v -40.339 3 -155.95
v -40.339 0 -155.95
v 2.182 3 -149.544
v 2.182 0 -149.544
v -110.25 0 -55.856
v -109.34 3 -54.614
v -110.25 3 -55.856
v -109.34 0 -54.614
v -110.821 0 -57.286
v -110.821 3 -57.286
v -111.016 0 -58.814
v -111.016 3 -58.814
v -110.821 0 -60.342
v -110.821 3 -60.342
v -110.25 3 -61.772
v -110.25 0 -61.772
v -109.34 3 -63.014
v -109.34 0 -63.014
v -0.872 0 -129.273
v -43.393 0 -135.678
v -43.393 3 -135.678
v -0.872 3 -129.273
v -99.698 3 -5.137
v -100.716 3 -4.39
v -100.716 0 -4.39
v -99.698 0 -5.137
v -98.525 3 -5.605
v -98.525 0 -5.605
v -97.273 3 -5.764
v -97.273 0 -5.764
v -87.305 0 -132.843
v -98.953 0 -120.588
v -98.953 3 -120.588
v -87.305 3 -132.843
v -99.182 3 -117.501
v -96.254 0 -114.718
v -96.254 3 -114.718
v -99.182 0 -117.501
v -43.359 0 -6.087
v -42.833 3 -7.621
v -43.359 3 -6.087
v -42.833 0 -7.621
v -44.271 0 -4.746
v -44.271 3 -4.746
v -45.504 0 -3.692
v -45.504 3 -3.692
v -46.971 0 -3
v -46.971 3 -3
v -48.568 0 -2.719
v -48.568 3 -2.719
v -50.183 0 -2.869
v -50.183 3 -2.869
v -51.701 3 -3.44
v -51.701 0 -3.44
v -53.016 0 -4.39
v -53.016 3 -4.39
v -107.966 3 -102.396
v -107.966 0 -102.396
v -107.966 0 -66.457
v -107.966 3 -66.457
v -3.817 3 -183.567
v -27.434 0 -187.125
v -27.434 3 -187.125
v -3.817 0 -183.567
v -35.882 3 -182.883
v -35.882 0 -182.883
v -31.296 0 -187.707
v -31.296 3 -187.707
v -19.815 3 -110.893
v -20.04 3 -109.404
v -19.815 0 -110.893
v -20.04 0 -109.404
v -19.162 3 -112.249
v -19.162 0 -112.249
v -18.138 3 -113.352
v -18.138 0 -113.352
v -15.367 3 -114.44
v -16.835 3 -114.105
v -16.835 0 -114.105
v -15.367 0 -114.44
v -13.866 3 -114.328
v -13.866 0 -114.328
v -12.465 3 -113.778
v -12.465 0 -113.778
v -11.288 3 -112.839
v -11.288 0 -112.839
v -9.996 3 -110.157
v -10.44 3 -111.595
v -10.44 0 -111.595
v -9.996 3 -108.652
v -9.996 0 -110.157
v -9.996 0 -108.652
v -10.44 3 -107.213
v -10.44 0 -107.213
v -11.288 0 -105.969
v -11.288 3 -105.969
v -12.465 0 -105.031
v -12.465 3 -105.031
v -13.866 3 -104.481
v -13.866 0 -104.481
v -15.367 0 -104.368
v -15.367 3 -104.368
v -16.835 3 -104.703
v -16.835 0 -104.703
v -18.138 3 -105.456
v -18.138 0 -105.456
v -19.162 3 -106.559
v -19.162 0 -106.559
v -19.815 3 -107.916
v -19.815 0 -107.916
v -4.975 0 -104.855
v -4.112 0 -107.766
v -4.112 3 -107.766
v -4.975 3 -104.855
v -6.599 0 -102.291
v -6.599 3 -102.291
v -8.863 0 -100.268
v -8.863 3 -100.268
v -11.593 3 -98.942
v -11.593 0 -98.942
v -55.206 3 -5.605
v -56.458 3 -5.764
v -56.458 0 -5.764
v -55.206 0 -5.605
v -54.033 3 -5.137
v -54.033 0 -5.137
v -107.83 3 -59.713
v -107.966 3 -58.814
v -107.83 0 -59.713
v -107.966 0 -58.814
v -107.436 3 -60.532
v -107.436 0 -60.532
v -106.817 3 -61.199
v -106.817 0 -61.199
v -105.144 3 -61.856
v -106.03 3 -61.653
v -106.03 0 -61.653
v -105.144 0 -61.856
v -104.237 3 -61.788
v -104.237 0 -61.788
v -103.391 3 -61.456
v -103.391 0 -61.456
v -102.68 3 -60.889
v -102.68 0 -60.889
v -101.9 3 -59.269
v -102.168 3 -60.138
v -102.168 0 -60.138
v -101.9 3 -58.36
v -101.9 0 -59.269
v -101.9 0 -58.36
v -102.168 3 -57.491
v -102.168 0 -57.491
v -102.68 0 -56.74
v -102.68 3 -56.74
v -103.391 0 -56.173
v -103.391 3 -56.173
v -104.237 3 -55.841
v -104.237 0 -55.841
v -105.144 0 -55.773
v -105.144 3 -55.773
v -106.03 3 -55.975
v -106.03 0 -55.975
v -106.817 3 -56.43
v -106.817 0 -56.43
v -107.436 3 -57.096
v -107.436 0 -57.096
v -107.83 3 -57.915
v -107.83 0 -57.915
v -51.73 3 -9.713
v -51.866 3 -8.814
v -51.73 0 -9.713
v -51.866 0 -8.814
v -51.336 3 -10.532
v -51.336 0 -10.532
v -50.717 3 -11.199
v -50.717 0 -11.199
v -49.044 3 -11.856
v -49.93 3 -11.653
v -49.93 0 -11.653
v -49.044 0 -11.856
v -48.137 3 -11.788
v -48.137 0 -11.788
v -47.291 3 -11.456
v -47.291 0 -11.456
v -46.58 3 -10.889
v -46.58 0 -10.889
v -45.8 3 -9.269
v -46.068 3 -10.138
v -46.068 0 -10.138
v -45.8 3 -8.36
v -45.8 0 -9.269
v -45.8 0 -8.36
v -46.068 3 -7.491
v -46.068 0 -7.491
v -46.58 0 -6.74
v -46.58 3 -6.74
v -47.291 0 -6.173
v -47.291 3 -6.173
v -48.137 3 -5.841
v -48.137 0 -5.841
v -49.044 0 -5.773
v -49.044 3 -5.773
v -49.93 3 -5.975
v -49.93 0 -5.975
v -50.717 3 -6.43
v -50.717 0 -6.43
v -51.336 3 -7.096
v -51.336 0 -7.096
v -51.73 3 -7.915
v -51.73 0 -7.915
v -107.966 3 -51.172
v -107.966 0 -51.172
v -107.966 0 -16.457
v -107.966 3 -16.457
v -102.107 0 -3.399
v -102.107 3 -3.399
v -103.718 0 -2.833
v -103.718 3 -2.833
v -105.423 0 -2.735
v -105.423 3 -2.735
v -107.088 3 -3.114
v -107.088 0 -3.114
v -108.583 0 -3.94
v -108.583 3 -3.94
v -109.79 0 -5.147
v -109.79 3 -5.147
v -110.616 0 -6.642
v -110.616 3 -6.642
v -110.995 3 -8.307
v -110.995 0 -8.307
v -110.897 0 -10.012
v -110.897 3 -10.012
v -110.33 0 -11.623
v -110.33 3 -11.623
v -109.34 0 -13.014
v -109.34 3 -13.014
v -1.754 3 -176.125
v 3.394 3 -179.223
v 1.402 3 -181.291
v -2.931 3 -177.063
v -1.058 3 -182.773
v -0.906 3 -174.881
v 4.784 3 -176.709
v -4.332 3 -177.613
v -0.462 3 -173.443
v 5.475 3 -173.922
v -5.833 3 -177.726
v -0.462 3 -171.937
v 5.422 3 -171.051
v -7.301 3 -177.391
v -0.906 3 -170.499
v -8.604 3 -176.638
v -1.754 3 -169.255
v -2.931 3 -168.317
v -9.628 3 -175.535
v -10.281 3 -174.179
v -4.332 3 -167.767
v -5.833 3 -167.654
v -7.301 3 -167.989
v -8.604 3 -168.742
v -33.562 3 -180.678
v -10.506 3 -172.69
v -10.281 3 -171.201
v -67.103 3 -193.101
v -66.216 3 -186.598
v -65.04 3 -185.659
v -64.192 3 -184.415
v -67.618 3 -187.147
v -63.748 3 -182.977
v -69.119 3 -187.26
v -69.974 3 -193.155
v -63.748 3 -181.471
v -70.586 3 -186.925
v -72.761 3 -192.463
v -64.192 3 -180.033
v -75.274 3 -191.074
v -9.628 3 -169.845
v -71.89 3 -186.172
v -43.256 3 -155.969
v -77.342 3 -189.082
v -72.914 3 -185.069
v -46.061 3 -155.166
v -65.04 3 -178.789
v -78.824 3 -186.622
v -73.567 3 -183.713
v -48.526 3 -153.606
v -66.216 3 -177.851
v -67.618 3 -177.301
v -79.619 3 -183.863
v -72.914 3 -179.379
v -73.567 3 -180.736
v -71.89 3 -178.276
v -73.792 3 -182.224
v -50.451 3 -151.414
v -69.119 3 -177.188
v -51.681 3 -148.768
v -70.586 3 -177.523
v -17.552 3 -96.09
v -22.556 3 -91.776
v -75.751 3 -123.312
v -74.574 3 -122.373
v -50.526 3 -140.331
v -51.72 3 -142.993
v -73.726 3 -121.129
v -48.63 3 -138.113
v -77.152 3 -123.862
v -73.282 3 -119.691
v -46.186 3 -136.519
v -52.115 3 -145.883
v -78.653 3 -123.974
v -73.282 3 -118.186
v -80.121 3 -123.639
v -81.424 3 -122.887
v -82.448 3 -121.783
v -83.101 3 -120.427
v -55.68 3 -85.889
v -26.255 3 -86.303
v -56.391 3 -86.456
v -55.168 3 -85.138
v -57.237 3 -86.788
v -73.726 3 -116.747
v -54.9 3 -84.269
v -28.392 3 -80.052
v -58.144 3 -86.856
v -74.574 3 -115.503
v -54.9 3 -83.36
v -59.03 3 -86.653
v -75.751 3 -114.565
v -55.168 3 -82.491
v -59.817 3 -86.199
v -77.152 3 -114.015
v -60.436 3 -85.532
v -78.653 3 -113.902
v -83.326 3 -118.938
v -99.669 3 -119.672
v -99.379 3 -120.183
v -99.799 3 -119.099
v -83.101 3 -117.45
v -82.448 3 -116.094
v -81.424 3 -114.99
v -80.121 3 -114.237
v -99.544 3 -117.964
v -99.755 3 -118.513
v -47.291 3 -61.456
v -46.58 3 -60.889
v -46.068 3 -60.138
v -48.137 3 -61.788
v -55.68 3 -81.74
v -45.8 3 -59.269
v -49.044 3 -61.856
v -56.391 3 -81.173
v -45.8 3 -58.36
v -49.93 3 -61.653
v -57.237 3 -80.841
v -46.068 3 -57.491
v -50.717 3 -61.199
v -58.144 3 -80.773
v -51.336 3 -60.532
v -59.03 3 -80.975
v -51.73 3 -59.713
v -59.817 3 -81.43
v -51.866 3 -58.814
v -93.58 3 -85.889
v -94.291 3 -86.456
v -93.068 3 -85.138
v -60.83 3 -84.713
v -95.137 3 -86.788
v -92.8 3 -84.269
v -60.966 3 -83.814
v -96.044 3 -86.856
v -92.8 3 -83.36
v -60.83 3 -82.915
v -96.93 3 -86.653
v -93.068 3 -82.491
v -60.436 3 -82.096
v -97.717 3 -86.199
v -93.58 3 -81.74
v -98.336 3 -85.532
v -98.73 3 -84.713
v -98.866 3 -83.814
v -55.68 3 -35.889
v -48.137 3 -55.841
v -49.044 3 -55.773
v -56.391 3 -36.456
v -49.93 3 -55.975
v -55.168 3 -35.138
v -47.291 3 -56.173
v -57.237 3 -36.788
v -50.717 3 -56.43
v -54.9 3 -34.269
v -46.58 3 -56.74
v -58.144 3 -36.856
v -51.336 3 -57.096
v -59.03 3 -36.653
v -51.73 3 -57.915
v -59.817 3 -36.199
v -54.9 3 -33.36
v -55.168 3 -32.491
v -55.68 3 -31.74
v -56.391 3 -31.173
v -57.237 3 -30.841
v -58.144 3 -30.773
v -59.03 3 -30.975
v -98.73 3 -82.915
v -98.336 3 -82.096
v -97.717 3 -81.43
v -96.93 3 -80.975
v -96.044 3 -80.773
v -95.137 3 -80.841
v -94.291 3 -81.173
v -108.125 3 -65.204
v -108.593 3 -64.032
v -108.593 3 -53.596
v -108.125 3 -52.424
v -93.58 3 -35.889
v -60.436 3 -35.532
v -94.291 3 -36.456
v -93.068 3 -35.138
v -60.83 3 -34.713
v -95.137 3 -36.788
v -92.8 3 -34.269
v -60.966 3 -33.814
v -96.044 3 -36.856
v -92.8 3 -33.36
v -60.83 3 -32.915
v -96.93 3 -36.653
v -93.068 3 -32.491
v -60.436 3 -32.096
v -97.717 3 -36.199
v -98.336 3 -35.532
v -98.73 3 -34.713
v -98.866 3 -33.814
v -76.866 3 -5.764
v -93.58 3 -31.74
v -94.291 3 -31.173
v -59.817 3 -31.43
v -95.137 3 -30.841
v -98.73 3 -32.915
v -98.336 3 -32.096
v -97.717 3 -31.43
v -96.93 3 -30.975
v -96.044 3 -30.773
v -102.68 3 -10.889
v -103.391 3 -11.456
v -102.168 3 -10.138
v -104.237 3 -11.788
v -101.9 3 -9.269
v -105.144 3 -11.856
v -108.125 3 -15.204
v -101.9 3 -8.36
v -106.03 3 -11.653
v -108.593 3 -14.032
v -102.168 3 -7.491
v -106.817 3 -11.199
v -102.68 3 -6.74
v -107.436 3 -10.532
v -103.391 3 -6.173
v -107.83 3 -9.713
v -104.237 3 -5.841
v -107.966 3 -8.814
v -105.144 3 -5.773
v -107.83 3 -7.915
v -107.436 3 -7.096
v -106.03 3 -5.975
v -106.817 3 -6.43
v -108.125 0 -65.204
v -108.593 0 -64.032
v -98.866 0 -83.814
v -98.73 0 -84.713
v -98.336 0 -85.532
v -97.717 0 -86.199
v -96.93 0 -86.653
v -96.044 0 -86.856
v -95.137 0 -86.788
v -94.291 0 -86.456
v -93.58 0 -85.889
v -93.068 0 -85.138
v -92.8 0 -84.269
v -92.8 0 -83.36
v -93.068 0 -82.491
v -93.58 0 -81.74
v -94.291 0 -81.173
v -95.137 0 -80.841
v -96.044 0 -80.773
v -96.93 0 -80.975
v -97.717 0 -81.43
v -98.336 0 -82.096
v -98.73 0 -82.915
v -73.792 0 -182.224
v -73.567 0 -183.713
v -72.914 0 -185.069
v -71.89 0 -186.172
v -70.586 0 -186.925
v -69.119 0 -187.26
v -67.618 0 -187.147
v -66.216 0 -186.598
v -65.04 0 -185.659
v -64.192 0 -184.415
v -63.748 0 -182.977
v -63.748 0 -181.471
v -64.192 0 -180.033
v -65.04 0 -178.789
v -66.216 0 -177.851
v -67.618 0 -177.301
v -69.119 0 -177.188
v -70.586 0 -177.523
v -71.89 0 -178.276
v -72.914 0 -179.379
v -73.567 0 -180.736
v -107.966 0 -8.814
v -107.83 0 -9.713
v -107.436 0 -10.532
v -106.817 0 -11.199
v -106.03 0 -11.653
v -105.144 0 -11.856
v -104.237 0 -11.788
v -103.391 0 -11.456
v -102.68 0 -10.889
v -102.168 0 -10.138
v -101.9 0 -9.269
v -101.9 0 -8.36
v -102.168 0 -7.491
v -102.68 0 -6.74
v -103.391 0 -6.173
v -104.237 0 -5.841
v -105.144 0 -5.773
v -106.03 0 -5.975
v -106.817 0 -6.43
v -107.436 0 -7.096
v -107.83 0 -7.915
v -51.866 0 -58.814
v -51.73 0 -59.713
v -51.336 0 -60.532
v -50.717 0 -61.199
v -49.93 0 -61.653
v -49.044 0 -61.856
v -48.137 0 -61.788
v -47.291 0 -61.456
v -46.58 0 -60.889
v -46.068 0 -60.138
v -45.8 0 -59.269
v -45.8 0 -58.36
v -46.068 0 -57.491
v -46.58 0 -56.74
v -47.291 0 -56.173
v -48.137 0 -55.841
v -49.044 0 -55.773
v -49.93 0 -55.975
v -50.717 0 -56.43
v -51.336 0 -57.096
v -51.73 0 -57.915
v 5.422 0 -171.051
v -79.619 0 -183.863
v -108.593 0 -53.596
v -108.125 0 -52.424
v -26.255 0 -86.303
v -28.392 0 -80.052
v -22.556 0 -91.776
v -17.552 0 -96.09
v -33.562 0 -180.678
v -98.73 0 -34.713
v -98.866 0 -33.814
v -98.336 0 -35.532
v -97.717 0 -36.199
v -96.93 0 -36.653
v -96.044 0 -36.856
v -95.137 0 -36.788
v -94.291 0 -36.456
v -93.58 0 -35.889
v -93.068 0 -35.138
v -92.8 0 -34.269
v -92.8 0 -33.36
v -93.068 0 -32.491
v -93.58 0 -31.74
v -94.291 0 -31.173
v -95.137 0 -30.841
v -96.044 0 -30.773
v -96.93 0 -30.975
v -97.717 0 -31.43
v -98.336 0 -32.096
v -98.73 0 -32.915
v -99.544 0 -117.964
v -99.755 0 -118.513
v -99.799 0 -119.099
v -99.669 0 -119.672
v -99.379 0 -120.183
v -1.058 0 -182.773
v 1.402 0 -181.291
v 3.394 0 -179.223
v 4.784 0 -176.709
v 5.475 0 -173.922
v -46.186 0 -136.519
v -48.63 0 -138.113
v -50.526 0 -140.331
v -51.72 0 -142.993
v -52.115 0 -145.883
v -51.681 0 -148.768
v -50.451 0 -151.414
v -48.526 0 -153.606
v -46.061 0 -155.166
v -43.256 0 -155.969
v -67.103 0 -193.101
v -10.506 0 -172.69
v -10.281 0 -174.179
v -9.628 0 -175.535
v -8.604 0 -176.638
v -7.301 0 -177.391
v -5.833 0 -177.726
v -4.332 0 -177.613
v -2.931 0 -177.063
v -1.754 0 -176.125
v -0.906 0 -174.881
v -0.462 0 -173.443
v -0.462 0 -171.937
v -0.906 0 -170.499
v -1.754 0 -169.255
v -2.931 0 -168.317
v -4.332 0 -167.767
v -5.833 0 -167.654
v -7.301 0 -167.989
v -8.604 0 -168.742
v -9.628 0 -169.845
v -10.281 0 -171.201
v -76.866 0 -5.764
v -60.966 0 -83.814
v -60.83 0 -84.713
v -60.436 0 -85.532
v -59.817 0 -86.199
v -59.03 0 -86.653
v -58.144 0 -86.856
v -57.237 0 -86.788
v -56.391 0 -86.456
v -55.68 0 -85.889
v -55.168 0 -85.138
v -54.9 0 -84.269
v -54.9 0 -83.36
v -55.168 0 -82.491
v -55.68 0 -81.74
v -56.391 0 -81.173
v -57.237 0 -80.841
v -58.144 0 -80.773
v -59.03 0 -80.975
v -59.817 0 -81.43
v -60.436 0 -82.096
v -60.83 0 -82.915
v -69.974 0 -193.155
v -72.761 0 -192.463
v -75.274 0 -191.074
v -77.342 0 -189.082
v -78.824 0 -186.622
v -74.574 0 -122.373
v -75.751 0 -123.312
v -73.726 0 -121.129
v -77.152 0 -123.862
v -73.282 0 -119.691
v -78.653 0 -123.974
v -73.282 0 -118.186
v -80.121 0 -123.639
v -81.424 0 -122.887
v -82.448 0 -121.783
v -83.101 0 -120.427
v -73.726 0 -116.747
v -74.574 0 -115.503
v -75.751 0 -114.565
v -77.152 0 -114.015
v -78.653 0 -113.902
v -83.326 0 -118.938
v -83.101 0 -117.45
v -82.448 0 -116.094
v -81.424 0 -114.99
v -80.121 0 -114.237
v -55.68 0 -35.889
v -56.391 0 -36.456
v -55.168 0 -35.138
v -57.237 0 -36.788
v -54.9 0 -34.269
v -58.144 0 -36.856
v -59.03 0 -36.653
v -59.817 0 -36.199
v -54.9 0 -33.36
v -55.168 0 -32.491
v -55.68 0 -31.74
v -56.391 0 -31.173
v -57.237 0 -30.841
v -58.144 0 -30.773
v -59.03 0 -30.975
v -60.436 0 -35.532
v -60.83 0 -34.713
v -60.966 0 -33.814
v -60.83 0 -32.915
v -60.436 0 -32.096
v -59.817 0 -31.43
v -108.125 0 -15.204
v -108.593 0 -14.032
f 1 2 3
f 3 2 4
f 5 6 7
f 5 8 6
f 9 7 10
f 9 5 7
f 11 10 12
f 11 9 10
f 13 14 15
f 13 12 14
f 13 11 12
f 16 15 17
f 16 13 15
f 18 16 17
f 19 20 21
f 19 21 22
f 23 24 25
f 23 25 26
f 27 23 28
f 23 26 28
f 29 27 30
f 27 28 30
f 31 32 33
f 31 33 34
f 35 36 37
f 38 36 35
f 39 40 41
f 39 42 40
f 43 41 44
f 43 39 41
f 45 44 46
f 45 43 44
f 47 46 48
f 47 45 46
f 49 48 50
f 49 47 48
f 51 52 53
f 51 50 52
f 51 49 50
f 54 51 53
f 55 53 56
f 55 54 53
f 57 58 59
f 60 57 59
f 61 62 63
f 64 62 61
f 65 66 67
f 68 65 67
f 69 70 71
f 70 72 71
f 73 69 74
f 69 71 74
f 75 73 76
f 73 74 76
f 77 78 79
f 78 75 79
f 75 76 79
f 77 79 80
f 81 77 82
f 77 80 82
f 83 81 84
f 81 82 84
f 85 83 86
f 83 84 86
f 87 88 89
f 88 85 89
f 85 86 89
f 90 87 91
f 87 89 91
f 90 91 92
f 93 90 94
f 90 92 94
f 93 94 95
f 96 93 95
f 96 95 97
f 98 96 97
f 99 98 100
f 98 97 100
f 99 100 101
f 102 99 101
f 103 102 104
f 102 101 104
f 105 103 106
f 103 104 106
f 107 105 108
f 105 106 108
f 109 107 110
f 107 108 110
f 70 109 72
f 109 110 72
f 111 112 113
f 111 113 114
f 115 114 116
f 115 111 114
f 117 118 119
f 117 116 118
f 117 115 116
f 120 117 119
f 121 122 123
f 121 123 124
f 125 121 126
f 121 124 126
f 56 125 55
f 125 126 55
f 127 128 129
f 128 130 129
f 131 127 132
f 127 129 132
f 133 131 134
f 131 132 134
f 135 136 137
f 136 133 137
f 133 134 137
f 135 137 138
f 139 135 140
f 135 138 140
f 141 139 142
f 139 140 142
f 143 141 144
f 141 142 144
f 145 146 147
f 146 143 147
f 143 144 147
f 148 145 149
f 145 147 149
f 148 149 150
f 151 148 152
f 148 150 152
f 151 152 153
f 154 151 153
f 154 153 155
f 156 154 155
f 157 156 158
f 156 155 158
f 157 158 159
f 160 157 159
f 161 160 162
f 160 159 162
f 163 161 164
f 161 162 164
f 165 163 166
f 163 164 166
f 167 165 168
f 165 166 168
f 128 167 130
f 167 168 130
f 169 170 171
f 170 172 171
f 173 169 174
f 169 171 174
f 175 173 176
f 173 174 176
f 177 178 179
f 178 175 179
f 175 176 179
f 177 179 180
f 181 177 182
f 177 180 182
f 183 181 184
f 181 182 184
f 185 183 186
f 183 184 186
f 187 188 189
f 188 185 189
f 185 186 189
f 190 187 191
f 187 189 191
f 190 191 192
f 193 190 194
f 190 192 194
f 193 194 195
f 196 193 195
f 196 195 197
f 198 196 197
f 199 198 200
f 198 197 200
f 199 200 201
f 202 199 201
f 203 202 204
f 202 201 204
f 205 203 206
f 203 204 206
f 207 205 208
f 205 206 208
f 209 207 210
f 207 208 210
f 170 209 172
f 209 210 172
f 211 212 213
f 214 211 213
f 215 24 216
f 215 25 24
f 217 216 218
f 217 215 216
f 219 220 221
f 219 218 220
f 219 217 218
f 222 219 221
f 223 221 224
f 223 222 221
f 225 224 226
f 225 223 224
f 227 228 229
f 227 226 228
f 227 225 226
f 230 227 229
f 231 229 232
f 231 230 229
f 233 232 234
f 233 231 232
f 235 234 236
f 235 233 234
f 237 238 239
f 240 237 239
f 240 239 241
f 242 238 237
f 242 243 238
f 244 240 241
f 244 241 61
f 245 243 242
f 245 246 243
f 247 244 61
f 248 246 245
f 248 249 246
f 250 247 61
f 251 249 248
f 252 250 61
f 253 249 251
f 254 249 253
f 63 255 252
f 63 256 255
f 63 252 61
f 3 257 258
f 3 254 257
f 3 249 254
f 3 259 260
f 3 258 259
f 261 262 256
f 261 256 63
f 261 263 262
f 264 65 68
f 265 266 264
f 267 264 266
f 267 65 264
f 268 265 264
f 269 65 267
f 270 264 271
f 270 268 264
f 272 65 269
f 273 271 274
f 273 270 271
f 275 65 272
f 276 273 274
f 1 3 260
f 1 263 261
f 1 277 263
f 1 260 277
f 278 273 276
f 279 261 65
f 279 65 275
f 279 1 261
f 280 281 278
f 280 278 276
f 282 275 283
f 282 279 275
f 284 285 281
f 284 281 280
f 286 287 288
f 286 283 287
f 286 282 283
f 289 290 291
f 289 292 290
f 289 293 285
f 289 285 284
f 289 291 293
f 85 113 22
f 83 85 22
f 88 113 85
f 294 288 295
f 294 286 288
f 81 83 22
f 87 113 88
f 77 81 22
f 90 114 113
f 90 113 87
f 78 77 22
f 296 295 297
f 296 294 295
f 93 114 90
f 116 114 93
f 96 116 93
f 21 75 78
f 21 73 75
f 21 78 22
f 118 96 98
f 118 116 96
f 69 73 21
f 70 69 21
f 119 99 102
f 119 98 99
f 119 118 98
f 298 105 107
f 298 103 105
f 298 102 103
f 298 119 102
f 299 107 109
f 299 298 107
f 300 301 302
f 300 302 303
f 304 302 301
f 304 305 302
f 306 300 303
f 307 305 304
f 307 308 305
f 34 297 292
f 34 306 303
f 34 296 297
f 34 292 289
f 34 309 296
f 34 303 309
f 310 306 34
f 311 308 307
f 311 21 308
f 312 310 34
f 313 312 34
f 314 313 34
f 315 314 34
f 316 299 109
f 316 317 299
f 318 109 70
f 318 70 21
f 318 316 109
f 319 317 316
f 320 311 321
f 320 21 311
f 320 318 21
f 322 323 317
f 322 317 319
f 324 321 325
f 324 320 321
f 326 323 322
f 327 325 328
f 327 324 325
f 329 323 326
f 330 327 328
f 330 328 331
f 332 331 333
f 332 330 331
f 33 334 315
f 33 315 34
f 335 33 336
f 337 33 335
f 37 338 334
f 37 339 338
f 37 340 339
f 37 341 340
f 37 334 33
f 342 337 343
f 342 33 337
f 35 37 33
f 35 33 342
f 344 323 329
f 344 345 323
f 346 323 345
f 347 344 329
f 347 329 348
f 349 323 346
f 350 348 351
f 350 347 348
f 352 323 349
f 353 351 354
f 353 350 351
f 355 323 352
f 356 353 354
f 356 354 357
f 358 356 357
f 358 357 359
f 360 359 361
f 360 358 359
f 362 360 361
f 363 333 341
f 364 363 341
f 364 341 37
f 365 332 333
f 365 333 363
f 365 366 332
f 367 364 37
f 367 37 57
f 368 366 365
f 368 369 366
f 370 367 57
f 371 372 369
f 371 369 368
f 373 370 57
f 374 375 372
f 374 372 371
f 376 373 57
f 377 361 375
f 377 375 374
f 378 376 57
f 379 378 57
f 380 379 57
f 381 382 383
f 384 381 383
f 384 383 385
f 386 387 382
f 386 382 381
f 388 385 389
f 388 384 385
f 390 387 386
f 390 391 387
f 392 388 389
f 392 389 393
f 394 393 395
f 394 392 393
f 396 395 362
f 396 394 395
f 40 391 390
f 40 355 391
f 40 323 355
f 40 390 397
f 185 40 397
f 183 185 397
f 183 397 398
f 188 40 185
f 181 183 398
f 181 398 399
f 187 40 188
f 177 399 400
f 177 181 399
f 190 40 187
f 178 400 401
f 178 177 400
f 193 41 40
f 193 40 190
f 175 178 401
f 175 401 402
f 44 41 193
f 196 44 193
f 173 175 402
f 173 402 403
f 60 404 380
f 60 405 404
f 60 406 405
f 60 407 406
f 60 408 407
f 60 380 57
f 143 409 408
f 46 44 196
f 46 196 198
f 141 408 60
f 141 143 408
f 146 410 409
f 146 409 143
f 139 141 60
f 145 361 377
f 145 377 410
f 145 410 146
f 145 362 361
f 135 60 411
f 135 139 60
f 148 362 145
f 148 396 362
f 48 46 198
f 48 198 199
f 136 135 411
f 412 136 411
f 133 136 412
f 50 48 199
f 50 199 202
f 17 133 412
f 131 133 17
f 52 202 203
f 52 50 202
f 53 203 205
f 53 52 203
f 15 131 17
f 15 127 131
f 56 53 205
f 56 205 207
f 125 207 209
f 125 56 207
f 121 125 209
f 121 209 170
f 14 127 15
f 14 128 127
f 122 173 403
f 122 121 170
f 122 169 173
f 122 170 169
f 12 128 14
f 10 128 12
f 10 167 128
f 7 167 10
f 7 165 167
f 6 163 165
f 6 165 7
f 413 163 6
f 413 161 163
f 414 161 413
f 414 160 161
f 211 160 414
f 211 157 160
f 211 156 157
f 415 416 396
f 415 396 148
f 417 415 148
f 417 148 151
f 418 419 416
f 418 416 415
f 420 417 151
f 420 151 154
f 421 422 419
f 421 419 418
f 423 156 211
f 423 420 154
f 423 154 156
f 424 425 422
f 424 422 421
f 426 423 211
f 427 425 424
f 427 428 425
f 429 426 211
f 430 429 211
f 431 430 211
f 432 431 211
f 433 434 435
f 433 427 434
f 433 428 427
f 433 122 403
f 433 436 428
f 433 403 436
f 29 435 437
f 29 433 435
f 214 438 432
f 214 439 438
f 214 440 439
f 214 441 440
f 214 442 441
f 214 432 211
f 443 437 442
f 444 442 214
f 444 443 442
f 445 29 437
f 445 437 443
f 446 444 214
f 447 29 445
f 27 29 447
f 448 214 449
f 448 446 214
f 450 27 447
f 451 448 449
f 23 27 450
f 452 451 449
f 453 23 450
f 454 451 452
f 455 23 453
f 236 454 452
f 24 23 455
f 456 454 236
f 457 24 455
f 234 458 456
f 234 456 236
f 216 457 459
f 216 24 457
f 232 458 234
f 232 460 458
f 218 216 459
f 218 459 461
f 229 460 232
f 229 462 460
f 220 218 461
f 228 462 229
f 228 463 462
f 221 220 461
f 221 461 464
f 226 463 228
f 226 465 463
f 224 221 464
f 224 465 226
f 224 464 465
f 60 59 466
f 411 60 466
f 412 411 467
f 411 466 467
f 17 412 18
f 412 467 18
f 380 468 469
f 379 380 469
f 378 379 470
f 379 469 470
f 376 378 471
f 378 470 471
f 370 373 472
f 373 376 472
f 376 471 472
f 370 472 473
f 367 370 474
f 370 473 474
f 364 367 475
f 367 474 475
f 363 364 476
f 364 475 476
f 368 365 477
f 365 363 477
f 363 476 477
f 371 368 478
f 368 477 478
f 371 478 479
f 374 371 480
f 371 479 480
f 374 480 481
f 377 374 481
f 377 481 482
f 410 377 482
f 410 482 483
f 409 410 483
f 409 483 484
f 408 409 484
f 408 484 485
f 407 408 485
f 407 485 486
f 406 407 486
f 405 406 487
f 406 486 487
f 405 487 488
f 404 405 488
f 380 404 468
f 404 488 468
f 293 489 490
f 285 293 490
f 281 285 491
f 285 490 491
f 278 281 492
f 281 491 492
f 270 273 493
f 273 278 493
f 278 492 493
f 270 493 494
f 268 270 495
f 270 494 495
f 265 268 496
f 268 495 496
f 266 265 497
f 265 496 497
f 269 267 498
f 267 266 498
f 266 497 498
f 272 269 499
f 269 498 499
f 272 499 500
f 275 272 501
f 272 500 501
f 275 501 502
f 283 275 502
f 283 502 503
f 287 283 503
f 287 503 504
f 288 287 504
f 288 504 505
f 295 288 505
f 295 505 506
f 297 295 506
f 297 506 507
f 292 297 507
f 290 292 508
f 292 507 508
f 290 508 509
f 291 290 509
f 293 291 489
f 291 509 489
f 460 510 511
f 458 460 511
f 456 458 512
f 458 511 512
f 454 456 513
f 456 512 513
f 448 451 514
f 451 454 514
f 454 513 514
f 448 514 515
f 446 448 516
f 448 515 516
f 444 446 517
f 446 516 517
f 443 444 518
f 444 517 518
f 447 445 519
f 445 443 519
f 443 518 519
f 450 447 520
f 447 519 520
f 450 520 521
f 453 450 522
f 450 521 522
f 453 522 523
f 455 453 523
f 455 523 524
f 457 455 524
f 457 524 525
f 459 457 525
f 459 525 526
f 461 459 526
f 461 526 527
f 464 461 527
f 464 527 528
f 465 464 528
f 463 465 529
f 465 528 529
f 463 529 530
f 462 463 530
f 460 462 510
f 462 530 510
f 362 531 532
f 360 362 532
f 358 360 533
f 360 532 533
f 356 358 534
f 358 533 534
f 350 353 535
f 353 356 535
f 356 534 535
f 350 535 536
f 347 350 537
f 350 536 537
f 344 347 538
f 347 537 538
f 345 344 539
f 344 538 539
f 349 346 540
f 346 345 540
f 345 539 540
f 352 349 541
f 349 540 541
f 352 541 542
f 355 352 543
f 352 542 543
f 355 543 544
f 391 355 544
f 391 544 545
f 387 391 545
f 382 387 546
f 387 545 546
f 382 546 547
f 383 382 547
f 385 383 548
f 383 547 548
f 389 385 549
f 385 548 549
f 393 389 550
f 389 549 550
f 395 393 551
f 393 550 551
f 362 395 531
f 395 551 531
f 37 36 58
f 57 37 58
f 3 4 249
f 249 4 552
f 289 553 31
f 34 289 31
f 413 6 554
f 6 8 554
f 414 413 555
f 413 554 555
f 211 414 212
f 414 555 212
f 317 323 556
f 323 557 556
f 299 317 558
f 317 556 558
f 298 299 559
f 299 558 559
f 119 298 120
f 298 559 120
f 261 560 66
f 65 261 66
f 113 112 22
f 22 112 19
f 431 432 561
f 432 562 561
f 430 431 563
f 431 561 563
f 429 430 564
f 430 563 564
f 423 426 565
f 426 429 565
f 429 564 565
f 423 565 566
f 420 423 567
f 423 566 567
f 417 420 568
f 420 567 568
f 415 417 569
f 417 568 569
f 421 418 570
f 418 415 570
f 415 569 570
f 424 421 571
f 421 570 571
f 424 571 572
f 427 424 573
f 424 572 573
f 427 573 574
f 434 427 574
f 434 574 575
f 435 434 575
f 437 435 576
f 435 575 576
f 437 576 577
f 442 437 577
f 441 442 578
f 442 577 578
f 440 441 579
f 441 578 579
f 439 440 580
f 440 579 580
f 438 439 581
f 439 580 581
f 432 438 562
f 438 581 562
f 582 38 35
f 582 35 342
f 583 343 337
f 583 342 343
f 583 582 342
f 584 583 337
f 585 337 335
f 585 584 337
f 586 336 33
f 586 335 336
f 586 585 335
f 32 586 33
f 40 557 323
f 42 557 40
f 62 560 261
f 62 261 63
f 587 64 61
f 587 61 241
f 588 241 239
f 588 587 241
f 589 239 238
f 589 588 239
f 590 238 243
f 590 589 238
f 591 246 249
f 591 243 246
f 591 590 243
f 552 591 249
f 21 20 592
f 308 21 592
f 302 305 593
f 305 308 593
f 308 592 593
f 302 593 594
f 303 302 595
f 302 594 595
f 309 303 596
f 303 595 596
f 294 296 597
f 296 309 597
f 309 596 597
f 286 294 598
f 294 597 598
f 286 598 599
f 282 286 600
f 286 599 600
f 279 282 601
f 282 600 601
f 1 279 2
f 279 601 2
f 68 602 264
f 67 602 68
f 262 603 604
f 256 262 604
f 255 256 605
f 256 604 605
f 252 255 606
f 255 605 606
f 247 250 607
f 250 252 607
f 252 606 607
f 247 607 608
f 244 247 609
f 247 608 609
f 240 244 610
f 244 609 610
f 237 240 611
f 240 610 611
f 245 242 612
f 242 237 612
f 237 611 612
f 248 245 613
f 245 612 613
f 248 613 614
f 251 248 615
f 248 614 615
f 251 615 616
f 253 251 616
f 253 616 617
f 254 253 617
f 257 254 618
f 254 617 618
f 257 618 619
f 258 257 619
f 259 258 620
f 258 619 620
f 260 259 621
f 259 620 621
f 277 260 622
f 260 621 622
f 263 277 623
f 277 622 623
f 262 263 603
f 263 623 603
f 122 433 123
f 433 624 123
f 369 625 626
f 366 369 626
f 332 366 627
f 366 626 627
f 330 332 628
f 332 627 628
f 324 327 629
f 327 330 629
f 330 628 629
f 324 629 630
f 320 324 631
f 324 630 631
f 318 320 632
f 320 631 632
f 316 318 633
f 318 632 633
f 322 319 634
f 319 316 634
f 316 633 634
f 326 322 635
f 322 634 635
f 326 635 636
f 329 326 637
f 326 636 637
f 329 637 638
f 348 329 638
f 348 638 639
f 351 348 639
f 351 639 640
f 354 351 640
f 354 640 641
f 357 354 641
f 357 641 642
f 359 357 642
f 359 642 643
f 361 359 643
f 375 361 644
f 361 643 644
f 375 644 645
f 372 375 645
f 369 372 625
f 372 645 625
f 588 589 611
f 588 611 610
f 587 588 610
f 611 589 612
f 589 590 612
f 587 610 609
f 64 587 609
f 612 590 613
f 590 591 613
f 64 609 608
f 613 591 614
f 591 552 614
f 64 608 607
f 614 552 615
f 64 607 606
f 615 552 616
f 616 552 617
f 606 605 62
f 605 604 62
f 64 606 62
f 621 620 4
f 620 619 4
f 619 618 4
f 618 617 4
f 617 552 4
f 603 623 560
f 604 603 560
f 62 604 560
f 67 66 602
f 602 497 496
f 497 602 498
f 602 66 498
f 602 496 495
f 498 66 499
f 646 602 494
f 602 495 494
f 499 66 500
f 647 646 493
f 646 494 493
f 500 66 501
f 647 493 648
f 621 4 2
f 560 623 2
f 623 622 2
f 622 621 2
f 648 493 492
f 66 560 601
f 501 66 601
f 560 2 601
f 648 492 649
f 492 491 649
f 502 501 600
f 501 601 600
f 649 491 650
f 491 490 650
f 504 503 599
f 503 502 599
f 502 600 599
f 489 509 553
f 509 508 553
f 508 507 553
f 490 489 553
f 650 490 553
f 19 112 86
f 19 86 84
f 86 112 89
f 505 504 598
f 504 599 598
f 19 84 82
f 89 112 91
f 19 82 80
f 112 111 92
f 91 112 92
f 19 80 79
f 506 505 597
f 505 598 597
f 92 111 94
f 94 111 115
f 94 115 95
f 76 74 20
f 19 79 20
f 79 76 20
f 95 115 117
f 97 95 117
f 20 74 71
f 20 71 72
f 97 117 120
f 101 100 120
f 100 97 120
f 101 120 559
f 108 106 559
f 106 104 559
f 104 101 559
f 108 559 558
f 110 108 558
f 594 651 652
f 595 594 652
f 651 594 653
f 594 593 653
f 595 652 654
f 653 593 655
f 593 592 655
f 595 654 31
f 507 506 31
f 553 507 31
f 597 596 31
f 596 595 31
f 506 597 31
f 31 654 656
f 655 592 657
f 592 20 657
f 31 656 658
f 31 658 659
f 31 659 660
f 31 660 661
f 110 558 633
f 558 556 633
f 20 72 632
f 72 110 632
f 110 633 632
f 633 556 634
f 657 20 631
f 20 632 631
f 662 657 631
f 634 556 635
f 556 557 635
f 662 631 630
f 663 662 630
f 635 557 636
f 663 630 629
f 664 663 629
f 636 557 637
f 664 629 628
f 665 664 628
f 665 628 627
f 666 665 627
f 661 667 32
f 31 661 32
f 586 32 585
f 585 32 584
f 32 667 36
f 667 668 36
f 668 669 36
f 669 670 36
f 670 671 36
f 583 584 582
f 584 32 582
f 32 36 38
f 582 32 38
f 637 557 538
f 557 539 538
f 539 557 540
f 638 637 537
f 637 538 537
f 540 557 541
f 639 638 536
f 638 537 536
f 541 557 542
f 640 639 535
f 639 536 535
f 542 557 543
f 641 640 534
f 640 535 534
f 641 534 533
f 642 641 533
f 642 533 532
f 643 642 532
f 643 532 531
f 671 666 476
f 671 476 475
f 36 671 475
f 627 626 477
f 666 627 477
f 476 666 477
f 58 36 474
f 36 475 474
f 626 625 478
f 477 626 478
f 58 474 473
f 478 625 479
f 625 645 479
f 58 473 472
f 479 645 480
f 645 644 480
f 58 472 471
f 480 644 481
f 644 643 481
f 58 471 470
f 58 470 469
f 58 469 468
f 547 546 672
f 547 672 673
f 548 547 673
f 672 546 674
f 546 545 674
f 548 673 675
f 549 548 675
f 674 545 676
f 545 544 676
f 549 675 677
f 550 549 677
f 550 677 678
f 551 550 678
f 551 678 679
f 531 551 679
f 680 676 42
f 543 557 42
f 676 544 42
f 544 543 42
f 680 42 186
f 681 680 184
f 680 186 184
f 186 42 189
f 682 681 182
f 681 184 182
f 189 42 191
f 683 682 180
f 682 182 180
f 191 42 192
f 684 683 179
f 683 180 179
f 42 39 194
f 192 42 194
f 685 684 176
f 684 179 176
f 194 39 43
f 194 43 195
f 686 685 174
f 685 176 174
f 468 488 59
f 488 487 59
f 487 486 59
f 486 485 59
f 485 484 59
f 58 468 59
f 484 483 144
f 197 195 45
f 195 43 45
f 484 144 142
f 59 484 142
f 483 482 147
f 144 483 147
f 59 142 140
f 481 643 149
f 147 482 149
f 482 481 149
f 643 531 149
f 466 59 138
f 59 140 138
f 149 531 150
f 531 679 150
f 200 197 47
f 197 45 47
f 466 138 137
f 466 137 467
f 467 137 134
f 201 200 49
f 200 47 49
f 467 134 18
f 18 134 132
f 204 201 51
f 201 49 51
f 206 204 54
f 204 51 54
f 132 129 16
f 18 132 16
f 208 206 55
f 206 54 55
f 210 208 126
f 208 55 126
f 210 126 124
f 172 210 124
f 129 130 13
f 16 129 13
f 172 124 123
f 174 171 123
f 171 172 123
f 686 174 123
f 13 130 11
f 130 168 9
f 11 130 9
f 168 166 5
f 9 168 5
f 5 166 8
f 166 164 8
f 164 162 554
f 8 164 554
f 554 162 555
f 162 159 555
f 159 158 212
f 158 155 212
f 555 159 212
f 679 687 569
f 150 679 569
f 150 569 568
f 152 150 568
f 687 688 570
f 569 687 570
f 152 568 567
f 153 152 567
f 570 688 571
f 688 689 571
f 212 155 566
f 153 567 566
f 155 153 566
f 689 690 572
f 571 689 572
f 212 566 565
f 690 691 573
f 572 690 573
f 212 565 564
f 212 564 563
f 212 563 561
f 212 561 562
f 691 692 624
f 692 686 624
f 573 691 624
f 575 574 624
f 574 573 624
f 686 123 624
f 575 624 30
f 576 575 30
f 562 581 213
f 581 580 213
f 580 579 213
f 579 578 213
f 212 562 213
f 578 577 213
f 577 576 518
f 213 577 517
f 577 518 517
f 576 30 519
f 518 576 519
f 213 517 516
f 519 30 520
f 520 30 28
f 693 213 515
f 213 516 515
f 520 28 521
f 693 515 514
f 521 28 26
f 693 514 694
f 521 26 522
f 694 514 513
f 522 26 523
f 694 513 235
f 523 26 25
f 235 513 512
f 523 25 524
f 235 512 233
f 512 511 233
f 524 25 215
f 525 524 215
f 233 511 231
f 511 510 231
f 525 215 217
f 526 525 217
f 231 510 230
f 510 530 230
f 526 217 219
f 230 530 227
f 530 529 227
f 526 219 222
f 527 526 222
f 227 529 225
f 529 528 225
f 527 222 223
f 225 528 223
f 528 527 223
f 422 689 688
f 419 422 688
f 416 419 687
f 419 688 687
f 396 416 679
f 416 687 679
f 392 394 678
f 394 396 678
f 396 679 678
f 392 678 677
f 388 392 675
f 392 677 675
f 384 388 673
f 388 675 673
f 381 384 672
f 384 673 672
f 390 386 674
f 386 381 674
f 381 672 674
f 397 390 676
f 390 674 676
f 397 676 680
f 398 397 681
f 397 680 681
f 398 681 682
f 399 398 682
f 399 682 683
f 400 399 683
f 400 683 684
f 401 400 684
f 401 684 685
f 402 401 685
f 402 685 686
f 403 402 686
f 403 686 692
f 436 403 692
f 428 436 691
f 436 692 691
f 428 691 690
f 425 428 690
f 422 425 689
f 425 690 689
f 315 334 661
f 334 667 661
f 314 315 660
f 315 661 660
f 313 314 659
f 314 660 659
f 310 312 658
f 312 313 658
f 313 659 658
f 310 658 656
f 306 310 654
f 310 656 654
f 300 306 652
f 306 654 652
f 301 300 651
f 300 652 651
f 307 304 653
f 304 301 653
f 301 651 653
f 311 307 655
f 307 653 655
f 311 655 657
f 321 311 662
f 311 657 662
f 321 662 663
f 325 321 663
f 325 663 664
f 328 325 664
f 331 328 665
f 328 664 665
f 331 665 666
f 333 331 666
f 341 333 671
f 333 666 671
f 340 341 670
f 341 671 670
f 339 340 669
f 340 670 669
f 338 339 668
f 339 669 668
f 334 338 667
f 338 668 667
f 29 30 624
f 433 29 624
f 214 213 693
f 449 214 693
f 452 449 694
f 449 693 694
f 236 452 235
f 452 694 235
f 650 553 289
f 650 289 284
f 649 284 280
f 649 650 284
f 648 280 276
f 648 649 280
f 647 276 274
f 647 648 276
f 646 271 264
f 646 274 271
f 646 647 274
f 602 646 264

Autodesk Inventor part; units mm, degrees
ref_plane "YZ Plane" through (0, 0, 0) normal (1, 0, 0) x (0, 1, 0)
ref_plane "XZ Plane" through (0, 0, 0) normal (0, 1, 0) x (-1, 0, 0)
ref_plane "XY Plane" through (0, 0, 0) normal (0, 0, 1) x (1, 0, 0)
sketch "Эскиз1" plane through (0, 0, 0) normal (0, 1, 0) x (-1, 0, 0)
  arc A0 (40.3387, -155.9498) -> (43.3926, -135.6785) centre (41.8656, -145.8142) ccw
  line L0 (111.6413, -108.8142) -> (38.7953, -108.8142) construction
  line L1 (76.8656, 21.9817) -> (76.8656, -112.0617)
  circle A1 centre (48.8156, -8.8142) radius 3.05
  circle A2 centre (57.9156, -33.8142) radius 3.05
  circle A3 centre (48.8156, -58.8142) radius 3.05
  circle A4 centre (57.9156, -83.8142) radius 3.05
  circle A5 centre (95.8156, -83.8142) radius 3.05
  circle A6 centre (104.9156, -58.8142) radius 3.05
  circle A7 centre (95.8156, -33.8142) radius 3.05
  circle A8 centre (104.9156, -8.8142) radius 3.05
  arc A9 (53.0155, -4.3903) -> (42.8334, -7.6214) centre (48.8156, -8.8142) ccw
  arc A10 (109.3395, -13.0141) -> (100.7157, -4.3903) centre (104.9156, -8.8142) ccw
  arc A11 (109.3395, -63.0141) -> (109.3395, -54.6142) centre (104.9156, -58.8142) ccw
  line L2 (107.9656, -102.3962) -> (107.9656, -66.4566)
  line L3 (107.9656, -51.1717) -> (107.9656, -16.4566)
  line L4 (97.2731, -5.7642) -> (56.4581, -5.7642)
  line L5 (28.3919, -80.0515) -> (42.8334, -7.6214)
  circle A12 centre (41.8656, -145.8142) radius 18 construction
  line L6 (101.8656, -108.8142) -> (101.8656, -72.3334) construction
  line L7 (101.8656, -108.8142) -> (33.562, -180.6784) construction
  line L8 (51.8656, -108.8142) -> (51.8656, -72.3334) construction
  line L9 (96.2539, -114.7184) -> (107.9656, -102.3962)
  line L10 (96.2539, -114.7184) -> (99.1818, -117.5012)
  arc A13 (98.953, -120.5879) -> (99.1818, -117.5012) centre (97.804, -118.9509) ccw
  circle A14 centre (41.8656, -145.8142) radius 45.2548 construction
  circle A15 centre (14.9897, -109.4042) radius 5.05
  circle A16 centre (5.4556, -172.69) radius 5.05
  arc A17 (-5.4216, -171.0513) -> (3.8169, -183.5673) centre (5.4556, -172.69) ccw
  line L11 (98.953, -120.5879) -> (87.305, -132.8431)
  arc A18 (109.3395, -63.0141) -> (107.9656, -66.4566) centre (112.9656, -66.4566) ccw
  arc A19 (107.9656, -51.1717) -> (109.3395, -54.6142) centre (112.9656, -51.1717) ccw
  arc A20 (109.3395, -13.0141) -> (107.9656, -16.4566) centre (112.9656, -16.4566) ccw
  arc A21 (97.2731, -5.7642) -> (100.7157, -4.3903) centre (97.2731, -0.7642) ccw
  arc A22 (53.0155, -4.3903) -> (56.4581, -5.7642) centre (56.4581, -0.7642) ccw
  circle A23 centre (68.7415, -182.2241) radius 5.05
  circle A24 centre (78.2756, -118.9383) radius 5.05
  arc A25 (67.1028, -193.1014) -> (79.6187, -183.8628) centre (68.7415, -182.2241) ccw
  arc A26 (11.5934, -98.9416) -> (4.1125, -107.7655) centre (14.9897, -109.4042) ccw
  line L12 (78.2756, -118.9383) -> (78.2756, -108.8142) construction
  line L13 (78.2756, -118.9383) -> (85.6139, -125.913) construction
  line L14 (67.1028, -193.1014) -> (3.8169, -183.5673)
  line L15 (79.6187, -183.8628) -> (87.305, -132.8431)
  arc A27 (82.6506, -129.0308) -> (83.6843, -128.5167) centre (78.2756, -118.9383) ccw
  arc A28 (11.5934, -98.9416) -> (28.3919, -80.0515) centre (3.8745, -75.1631) ccw
  line L16 (43.3926, -135.6785) -> (0.8724, -129.2728)
  line L17 (40.3387, -155.9498) -> (-2.1815, -149.544)
  line L18 (4.1125, -107.7655) -> (0.8724, -129.2728)
  line L19 (-2.1815, -149.544) -> (-5.4216, -171.0513)
  line L20 (33.562, -180.6784) -> (35.8815, -182.8829)
  line L21 (35.8815, -182.8829) -> (31.2963, -187.7071)
  line L22 (33.562, -180.6784) -> (27.4345, -187.1253)
  point P0 (0, 0)
  point P1 (107.9656, -64.0969)
  point P2 (107.9656, -53.5314)
  point P3 (107.9656, -14.0969)
  point P4 (99.6329, -5.7642)
  point P5 (54.0984, -5.7642)
  point P6 (100.603, -118.8519)
  point P7 (21.7907, -113.1589)
  point P8 (80.5833, -139.9152)
  point P9 (85.6933, -134.5388)
  dimension "d4" = 37.9
  dimension "d5" = 56.1
  dimension "d6" = 6.1
  dimension "d7" = 50
  dimension "d8" = 50
  dimension "d9" = 25
  dimension "d10" = 50
  dimension "d11" = 37.9
  dimension "d12" = 56.1
  dimension "d15" = 35
  dimension "d16" = 37
  dimension "d17" = 20.5
  dimension "d20" = 12.2
  dimension "d21" = 12.2
  dimension "d24" = 3.05
  dimension "d26" = 36
  dimension "d29" = 50
  dimension "d33" = 10.1
  dimension "d36" = 360
  dimension "d38" = 64
  dimension "d44" = 22
  dimension "d45" = 6
  dimension "d49" = 17
  dimension "d52" = 5
  dimension "d54" = 25
  dimension "d55" = 3.2
  dimension "d56" = 91
extrude "Выдавливание1" add sketch "Эскиз1" along normal blind 3 contours A0 L16 L18 A26 A28 L5 A9 A22 L4 A21 A10 A20 L3 A19 A11 A18 L2 L9 L10 A13 L11 L15 A25 L14 L21 L20 L22 A17 L19 L17
sketch "Эскиз2" plane through (0, 3, 0) normal (0, 1, 0) x (1, 0, 0)
  line L0 (-107.9656, 102.3962) -> (-107.9656, 66.4566) projected
  arc A0 (-109.3395, 63.0141) -> (-109.3395, 54.6142) centre (-104.9156, 58.8142) ccw projected
  line L1 (-107.9656, 51.1717) -> (-107.9656, 16.4566) projected
  arc A1 (-109.3395, 13.0141) -> (-100.7157, 4.3903) centre (-104.9156, 8.8142) ccw projected
  line L2 (-97.2731, 5.7642) -> (-56.4581, 5.7642) projected
  arc A2 (-53.0155, 4.3903) -> (-42.8334, 7.6214) centre (-48.8156, 8.8142) ccw projected
  line L3 (-42.8334, 7.6214) -> (-28.3919, 80.0515) projected
  arc A3 (5.4216, 171.0513) -> (-3.8169, 183.5673) centre (-5.4556, 172.69) ccw projected
  line L4 (-87.305, 132.8431) -> (-98.953, 120.5879) projected
  arc A4 (-98.953, 120.5879) -> (-99.1818, 117.5012) centre (-97.804, 118.9509) ccw projected
  line L5 (-99.1818, 117.5012) -> (-96.2539, 114.7184) projected
  line L6 (-96.2539, 114.7184) -> (-107.9656, 102.3962) projected
  circle A5 centre (-95.8156, 33.8142) radius 3.05 projected
  circle A6 centre (-95.8156, 83.8142) radius 3.05 projected
  circle A7 centre (-57.9156, 83.8142) radius 3.05 projected
  circle A8 centre (-48.8156, 58.8142) radius 3.05 projected
  circle A9 centre (-57.9156, 33.8142) radius 3.05 projected
  arc A10 (-40.3387, 155.9498) -> (-43.3926, 135.6785) centre (-41.8656, 145.8142) ccw projected
  circle A11 centre (-5.4556, 172.69) radius 5.05 projected
  circle A12 centre (-14.9897, 109.4042) radius 5.05 projected
  circle A13 centre (-104.9156, 8.8142) radius 3.05 projected
  circle A14 centre (-104.9156, 58.8142) radius 3.05 projected
  circle A15 centre (-48.8156, 8.8142) radius 3.05 projected
  arc A16 (-109.3395, 63.0141) -> (-107.9656, 66.4566) centre (-112.9656, 66.4566) ccw projected
  arc A17 (-107.9656, 51.1717) -> (-109.3395, 54.6142) centre (-112.9656, 51.1717) ccw projected
  arc A18 (-109.3395, 13.0141) -> (-107.9656, 16.4566) centre (-112.9656, 16.4566) ccw projected
  arc A19 (-97.2731, 5.7642) -> (-100.7157, 4.3903) centre (-97.2731, 0.7642) ccw projected
  arc A20 (-53.0155, 4.3903) -> (-56.4581, 5.7642) centre (-56.4581, 0.7642) ccw projected
  arc A21 (-11.5934, 98.9416) -> (-28.3919, 80.0515) centre (-3.8745, 75.1631) ccw projected
  arc A22 (-11.5934, 98.9416) -> (-4.1125, 107.7655) centre (-14.9897, 109.4042) ccw projected
  line L7 (-4.1125, 107.7655) -> (-0.8724, 129.2728) projected
  line L8 (-0.8724, 129.2728) -> (-43.3926, 135.6785) projected
  line L9 (-40.3387, 155.9498) -> (2.1815, 149.544) projected
  line L10 (2.1815, 149.544) -> (5.4216, 171.0513) projected
  line L11 (-3.8169, 183.5673) -> (-27.4345, 187.1253) projected
  arc A23 (-67.1028, 193.1014) -> (-79.6187, 183.8628) centre (-68.7415, 182.2241) ccw projected
  line L12 (-79.6187, 183.8628) -> (-87.305, 132.8431) projected
  line L13 (-27.4345, 187.1253) -> (-33.562, 180.6784) projected
  line L14 (-33.562, 180.6784) -> (-35.8815, 182.8829) projected
  line L15 (-35.8815, 182.8829) -> (-31.2963, 187.7071) projected
  line L16 (-31.2963, 187.7071) -> (-67.1028, 193.1014) projected
  point P0 (0, 0)
equation "\"d4\" = -d_main_screw_holes + hight_profile_femur - 2 * thickness_profile_femur"
equation "\"d5\" = hight_profile_femur + d_main_screw_holes"
equation "\"d6\" = d_main_screw_holes"
equation "\"d11\" = -d_main_screw_holes + hight_profile_femur - 2 * thickness_profile_femur"
equation "\"d12\" = hight_profile_femur + d_main_screw_holes"
equation "\"d15\" = width_shaft_shift"
equation "\"d20\" = 2 * d_main_screw_holes"
equation "\"d21\" = 2 * d_main_screw_holes"
equation "\"d24\" = 0.5 * d_main_screw_holes"
equation "\"d29\" = width_profile_femur"
equation "\"d2\" = thickness_steel"
equation "\"tolerance_plazma\" = 0.1"
equation "\"thickness_steel\" = 3"
equation "\"d_main_screw_holes\" = 6.1"
equation "\"thickness_profile_tibea\" = 3"
equation "\"hight_shaft_shift\" = 37"
equation "\"thickness_profile_femur\" = 3"
equation "\"width_profile_femur\" = 50"
equation "\"width_shaft_shift\" = 35"
equation "\"hight_profile_femur\" = 50"
equation "\"width_flattened_surface\" = 12"
properties part number "femur_support_steel" material "Сталь"
